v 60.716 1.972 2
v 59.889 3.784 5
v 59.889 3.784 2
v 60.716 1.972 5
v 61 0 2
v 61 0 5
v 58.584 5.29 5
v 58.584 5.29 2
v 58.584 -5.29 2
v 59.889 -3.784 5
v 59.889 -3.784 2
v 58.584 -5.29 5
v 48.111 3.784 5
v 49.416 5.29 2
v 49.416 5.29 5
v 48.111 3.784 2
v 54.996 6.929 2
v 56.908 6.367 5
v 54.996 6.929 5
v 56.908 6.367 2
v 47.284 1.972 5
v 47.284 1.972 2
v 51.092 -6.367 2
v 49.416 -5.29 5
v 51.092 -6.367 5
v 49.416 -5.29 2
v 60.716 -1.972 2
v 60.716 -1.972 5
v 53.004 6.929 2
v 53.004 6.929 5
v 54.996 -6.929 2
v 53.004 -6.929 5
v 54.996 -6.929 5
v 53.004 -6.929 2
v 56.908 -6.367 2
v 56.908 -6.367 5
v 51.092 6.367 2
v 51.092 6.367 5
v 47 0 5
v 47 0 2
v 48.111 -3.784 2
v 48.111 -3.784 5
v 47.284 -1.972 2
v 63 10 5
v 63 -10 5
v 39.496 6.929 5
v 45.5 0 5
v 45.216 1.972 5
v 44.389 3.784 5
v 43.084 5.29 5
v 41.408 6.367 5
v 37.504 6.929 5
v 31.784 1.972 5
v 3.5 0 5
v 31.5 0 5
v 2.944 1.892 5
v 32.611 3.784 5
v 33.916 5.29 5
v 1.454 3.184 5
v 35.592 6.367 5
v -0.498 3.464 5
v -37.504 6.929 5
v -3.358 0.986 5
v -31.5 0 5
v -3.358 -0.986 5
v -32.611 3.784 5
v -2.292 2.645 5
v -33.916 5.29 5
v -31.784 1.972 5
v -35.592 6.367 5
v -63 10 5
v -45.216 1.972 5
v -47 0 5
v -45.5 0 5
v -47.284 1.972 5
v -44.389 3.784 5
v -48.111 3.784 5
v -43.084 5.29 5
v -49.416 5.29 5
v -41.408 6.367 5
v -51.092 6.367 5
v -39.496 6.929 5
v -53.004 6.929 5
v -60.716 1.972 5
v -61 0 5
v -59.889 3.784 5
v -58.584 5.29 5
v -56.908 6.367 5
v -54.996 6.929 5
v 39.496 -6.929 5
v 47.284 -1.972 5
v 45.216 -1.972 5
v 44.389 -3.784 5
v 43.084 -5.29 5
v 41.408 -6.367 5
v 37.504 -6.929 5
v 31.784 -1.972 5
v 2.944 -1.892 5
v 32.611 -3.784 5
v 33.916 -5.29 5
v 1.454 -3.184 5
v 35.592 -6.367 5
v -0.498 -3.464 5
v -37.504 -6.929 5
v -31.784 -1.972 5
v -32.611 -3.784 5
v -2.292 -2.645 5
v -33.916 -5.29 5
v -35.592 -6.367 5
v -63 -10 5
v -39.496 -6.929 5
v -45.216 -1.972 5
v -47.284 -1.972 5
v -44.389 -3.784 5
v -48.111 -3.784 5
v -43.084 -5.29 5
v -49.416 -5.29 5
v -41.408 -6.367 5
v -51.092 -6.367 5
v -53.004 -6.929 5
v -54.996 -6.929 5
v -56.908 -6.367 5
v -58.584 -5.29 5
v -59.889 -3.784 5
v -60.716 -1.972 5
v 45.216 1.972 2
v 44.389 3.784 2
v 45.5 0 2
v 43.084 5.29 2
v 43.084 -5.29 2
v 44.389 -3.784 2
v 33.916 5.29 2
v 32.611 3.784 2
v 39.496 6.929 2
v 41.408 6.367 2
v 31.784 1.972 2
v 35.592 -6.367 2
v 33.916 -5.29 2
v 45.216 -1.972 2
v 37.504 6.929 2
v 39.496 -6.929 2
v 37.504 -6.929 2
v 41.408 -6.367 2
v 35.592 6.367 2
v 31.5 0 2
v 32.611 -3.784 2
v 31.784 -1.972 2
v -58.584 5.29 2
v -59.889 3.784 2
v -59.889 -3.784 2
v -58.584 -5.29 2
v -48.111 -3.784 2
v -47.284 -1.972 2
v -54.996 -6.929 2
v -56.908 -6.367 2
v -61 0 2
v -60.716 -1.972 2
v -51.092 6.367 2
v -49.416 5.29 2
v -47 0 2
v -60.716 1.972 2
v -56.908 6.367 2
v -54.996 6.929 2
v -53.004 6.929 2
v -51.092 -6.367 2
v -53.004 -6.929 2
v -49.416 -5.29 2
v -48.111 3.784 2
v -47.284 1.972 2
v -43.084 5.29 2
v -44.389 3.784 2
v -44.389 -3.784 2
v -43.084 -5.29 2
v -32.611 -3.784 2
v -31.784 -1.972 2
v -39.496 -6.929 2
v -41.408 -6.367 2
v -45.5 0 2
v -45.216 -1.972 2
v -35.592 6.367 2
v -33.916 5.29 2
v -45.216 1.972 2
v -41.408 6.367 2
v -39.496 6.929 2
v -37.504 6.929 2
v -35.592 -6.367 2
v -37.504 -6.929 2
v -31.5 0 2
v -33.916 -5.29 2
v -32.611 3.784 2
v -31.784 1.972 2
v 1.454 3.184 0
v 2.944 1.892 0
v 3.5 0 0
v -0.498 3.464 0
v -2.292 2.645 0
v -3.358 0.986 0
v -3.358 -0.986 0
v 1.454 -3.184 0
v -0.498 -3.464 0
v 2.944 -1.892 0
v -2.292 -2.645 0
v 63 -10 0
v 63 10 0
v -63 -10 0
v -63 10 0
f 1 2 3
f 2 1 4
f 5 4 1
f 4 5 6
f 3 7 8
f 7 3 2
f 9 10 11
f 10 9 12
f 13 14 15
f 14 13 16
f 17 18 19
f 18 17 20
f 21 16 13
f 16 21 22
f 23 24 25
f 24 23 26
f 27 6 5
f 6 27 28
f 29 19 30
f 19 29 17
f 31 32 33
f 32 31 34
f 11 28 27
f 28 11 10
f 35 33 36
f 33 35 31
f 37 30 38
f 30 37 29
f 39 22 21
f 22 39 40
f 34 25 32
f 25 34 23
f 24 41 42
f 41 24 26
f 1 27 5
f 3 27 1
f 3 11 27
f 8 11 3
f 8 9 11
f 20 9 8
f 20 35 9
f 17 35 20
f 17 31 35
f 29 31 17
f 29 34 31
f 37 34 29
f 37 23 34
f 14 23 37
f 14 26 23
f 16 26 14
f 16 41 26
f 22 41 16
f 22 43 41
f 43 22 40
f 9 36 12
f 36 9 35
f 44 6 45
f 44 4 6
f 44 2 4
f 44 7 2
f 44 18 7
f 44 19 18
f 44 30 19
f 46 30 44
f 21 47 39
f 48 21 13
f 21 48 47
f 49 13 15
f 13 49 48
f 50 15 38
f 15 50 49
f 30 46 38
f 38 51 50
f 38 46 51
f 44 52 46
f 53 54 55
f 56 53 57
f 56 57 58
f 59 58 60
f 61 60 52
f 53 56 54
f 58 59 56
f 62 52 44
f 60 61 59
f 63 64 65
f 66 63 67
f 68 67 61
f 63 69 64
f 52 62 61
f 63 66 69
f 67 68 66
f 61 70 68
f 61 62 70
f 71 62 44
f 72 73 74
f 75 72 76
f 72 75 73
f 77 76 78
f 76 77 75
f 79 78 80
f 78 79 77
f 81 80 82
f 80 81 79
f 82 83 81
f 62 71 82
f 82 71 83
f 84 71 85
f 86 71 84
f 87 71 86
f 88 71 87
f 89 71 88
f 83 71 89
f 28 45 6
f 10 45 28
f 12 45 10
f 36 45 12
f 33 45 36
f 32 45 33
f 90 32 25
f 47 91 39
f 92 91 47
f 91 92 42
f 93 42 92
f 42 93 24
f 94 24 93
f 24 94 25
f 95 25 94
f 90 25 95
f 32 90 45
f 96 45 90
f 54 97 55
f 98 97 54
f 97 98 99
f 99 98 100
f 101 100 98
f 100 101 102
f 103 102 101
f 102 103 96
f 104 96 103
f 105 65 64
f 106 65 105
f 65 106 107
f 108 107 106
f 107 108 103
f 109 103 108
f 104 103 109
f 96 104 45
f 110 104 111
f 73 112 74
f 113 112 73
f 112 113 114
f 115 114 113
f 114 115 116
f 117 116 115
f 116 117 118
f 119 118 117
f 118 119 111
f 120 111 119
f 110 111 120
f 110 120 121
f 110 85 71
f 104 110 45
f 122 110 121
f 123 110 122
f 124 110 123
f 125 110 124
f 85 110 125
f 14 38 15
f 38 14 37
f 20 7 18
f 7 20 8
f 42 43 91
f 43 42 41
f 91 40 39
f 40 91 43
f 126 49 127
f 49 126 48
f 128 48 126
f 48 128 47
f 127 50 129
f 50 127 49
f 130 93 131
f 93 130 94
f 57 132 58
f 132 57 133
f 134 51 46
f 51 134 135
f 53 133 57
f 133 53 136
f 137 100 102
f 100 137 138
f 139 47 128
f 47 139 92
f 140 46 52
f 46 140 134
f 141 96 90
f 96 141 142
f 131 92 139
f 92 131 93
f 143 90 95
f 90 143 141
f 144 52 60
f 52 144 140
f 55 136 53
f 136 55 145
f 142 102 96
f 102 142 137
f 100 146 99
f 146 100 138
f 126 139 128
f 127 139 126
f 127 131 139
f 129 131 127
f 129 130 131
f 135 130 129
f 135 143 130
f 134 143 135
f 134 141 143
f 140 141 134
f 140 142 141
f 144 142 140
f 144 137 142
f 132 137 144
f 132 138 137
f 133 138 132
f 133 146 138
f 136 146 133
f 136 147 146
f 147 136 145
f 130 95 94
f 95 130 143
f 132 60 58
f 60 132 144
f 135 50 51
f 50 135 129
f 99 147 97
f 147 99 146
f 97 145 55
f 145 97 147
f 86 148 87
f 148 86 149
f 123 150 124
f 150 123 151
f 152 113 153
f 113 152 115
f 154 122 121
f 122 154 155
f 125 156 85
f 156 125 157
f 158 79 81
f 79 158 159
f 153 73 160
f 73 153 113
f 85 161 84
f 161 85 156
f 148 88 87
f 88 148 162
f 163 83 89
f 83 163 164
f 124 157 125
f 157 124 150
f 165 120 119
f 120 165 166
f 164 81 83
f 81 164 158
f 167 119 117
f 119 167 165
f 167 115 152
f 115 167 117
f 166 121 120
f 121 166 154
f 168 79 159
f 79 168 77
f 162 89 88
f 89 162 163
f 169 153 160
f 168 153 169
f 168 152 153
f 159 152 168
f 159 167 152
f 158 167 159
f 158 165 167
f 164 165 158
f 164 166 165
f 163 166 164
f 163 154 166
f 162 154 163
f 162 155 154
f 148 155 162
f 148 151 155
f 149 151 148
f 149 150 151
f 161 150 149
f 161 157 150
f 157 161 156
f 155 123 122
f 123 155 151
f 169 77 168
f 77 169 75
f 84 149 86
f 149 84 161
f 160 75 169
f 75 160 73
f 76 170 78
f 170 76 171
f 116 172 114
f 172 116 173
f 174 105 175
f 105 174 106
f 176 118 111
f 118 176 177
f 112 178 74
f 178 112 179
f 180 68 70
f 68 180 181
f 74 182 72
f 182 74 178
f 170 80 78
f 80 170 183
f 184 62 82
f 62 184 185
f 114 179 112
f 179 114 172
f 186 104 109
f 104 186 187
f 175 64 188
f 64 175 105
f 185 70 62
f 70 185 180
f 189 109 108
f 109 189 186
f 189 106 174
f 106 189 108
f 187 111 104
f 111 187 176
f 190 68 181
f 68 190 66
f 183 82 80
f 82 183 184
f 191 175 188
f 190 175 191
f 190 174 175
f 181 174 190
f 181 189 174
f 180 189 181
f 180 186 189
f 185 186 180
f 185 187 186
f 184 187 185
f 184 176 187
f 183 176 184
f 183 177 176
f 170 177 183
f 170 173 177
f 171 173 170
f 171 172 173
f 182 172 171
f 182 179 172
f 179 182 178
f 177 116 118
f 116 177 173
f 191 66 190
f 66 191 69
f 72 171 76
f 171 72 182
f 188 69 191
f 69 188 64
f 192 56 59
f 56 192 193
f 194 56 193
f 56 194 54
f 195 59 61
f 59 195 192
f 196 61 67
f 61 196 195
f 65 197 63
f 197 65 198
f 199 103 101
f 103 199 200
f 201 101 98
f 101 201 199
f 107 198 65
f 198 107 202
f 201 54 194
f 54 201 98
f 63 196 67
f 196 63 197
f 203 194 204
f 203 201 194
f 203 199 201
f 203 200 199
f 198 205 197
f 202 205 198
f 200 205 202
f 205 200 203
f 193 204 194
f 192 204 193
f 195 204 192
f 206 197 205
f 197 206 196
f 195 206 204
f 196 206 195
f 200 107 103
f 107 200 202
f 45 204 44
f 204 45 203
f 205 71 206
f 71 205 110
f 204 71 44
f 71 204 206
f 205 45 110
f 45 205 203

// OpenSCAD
%cube([40,60,80]);
s1=1.5;

	
difference(){
		union(){
			translate([-s1*42,-10,0]) cube([s1*84,20,5]); 
			//cylinder(5,14,14); 		
			
}
union(){
	for(i=[0:1]){
			rotate([0,0,i*180]) translate([s1*36,0,2]) cylinder(3,7,7);
			rotate([0,0,i*180]) translate([s1*35-14,0,2]) cylinder(3,7,7);
			}

	cylinder(150,3.5,3.5);
}
}
		

	
